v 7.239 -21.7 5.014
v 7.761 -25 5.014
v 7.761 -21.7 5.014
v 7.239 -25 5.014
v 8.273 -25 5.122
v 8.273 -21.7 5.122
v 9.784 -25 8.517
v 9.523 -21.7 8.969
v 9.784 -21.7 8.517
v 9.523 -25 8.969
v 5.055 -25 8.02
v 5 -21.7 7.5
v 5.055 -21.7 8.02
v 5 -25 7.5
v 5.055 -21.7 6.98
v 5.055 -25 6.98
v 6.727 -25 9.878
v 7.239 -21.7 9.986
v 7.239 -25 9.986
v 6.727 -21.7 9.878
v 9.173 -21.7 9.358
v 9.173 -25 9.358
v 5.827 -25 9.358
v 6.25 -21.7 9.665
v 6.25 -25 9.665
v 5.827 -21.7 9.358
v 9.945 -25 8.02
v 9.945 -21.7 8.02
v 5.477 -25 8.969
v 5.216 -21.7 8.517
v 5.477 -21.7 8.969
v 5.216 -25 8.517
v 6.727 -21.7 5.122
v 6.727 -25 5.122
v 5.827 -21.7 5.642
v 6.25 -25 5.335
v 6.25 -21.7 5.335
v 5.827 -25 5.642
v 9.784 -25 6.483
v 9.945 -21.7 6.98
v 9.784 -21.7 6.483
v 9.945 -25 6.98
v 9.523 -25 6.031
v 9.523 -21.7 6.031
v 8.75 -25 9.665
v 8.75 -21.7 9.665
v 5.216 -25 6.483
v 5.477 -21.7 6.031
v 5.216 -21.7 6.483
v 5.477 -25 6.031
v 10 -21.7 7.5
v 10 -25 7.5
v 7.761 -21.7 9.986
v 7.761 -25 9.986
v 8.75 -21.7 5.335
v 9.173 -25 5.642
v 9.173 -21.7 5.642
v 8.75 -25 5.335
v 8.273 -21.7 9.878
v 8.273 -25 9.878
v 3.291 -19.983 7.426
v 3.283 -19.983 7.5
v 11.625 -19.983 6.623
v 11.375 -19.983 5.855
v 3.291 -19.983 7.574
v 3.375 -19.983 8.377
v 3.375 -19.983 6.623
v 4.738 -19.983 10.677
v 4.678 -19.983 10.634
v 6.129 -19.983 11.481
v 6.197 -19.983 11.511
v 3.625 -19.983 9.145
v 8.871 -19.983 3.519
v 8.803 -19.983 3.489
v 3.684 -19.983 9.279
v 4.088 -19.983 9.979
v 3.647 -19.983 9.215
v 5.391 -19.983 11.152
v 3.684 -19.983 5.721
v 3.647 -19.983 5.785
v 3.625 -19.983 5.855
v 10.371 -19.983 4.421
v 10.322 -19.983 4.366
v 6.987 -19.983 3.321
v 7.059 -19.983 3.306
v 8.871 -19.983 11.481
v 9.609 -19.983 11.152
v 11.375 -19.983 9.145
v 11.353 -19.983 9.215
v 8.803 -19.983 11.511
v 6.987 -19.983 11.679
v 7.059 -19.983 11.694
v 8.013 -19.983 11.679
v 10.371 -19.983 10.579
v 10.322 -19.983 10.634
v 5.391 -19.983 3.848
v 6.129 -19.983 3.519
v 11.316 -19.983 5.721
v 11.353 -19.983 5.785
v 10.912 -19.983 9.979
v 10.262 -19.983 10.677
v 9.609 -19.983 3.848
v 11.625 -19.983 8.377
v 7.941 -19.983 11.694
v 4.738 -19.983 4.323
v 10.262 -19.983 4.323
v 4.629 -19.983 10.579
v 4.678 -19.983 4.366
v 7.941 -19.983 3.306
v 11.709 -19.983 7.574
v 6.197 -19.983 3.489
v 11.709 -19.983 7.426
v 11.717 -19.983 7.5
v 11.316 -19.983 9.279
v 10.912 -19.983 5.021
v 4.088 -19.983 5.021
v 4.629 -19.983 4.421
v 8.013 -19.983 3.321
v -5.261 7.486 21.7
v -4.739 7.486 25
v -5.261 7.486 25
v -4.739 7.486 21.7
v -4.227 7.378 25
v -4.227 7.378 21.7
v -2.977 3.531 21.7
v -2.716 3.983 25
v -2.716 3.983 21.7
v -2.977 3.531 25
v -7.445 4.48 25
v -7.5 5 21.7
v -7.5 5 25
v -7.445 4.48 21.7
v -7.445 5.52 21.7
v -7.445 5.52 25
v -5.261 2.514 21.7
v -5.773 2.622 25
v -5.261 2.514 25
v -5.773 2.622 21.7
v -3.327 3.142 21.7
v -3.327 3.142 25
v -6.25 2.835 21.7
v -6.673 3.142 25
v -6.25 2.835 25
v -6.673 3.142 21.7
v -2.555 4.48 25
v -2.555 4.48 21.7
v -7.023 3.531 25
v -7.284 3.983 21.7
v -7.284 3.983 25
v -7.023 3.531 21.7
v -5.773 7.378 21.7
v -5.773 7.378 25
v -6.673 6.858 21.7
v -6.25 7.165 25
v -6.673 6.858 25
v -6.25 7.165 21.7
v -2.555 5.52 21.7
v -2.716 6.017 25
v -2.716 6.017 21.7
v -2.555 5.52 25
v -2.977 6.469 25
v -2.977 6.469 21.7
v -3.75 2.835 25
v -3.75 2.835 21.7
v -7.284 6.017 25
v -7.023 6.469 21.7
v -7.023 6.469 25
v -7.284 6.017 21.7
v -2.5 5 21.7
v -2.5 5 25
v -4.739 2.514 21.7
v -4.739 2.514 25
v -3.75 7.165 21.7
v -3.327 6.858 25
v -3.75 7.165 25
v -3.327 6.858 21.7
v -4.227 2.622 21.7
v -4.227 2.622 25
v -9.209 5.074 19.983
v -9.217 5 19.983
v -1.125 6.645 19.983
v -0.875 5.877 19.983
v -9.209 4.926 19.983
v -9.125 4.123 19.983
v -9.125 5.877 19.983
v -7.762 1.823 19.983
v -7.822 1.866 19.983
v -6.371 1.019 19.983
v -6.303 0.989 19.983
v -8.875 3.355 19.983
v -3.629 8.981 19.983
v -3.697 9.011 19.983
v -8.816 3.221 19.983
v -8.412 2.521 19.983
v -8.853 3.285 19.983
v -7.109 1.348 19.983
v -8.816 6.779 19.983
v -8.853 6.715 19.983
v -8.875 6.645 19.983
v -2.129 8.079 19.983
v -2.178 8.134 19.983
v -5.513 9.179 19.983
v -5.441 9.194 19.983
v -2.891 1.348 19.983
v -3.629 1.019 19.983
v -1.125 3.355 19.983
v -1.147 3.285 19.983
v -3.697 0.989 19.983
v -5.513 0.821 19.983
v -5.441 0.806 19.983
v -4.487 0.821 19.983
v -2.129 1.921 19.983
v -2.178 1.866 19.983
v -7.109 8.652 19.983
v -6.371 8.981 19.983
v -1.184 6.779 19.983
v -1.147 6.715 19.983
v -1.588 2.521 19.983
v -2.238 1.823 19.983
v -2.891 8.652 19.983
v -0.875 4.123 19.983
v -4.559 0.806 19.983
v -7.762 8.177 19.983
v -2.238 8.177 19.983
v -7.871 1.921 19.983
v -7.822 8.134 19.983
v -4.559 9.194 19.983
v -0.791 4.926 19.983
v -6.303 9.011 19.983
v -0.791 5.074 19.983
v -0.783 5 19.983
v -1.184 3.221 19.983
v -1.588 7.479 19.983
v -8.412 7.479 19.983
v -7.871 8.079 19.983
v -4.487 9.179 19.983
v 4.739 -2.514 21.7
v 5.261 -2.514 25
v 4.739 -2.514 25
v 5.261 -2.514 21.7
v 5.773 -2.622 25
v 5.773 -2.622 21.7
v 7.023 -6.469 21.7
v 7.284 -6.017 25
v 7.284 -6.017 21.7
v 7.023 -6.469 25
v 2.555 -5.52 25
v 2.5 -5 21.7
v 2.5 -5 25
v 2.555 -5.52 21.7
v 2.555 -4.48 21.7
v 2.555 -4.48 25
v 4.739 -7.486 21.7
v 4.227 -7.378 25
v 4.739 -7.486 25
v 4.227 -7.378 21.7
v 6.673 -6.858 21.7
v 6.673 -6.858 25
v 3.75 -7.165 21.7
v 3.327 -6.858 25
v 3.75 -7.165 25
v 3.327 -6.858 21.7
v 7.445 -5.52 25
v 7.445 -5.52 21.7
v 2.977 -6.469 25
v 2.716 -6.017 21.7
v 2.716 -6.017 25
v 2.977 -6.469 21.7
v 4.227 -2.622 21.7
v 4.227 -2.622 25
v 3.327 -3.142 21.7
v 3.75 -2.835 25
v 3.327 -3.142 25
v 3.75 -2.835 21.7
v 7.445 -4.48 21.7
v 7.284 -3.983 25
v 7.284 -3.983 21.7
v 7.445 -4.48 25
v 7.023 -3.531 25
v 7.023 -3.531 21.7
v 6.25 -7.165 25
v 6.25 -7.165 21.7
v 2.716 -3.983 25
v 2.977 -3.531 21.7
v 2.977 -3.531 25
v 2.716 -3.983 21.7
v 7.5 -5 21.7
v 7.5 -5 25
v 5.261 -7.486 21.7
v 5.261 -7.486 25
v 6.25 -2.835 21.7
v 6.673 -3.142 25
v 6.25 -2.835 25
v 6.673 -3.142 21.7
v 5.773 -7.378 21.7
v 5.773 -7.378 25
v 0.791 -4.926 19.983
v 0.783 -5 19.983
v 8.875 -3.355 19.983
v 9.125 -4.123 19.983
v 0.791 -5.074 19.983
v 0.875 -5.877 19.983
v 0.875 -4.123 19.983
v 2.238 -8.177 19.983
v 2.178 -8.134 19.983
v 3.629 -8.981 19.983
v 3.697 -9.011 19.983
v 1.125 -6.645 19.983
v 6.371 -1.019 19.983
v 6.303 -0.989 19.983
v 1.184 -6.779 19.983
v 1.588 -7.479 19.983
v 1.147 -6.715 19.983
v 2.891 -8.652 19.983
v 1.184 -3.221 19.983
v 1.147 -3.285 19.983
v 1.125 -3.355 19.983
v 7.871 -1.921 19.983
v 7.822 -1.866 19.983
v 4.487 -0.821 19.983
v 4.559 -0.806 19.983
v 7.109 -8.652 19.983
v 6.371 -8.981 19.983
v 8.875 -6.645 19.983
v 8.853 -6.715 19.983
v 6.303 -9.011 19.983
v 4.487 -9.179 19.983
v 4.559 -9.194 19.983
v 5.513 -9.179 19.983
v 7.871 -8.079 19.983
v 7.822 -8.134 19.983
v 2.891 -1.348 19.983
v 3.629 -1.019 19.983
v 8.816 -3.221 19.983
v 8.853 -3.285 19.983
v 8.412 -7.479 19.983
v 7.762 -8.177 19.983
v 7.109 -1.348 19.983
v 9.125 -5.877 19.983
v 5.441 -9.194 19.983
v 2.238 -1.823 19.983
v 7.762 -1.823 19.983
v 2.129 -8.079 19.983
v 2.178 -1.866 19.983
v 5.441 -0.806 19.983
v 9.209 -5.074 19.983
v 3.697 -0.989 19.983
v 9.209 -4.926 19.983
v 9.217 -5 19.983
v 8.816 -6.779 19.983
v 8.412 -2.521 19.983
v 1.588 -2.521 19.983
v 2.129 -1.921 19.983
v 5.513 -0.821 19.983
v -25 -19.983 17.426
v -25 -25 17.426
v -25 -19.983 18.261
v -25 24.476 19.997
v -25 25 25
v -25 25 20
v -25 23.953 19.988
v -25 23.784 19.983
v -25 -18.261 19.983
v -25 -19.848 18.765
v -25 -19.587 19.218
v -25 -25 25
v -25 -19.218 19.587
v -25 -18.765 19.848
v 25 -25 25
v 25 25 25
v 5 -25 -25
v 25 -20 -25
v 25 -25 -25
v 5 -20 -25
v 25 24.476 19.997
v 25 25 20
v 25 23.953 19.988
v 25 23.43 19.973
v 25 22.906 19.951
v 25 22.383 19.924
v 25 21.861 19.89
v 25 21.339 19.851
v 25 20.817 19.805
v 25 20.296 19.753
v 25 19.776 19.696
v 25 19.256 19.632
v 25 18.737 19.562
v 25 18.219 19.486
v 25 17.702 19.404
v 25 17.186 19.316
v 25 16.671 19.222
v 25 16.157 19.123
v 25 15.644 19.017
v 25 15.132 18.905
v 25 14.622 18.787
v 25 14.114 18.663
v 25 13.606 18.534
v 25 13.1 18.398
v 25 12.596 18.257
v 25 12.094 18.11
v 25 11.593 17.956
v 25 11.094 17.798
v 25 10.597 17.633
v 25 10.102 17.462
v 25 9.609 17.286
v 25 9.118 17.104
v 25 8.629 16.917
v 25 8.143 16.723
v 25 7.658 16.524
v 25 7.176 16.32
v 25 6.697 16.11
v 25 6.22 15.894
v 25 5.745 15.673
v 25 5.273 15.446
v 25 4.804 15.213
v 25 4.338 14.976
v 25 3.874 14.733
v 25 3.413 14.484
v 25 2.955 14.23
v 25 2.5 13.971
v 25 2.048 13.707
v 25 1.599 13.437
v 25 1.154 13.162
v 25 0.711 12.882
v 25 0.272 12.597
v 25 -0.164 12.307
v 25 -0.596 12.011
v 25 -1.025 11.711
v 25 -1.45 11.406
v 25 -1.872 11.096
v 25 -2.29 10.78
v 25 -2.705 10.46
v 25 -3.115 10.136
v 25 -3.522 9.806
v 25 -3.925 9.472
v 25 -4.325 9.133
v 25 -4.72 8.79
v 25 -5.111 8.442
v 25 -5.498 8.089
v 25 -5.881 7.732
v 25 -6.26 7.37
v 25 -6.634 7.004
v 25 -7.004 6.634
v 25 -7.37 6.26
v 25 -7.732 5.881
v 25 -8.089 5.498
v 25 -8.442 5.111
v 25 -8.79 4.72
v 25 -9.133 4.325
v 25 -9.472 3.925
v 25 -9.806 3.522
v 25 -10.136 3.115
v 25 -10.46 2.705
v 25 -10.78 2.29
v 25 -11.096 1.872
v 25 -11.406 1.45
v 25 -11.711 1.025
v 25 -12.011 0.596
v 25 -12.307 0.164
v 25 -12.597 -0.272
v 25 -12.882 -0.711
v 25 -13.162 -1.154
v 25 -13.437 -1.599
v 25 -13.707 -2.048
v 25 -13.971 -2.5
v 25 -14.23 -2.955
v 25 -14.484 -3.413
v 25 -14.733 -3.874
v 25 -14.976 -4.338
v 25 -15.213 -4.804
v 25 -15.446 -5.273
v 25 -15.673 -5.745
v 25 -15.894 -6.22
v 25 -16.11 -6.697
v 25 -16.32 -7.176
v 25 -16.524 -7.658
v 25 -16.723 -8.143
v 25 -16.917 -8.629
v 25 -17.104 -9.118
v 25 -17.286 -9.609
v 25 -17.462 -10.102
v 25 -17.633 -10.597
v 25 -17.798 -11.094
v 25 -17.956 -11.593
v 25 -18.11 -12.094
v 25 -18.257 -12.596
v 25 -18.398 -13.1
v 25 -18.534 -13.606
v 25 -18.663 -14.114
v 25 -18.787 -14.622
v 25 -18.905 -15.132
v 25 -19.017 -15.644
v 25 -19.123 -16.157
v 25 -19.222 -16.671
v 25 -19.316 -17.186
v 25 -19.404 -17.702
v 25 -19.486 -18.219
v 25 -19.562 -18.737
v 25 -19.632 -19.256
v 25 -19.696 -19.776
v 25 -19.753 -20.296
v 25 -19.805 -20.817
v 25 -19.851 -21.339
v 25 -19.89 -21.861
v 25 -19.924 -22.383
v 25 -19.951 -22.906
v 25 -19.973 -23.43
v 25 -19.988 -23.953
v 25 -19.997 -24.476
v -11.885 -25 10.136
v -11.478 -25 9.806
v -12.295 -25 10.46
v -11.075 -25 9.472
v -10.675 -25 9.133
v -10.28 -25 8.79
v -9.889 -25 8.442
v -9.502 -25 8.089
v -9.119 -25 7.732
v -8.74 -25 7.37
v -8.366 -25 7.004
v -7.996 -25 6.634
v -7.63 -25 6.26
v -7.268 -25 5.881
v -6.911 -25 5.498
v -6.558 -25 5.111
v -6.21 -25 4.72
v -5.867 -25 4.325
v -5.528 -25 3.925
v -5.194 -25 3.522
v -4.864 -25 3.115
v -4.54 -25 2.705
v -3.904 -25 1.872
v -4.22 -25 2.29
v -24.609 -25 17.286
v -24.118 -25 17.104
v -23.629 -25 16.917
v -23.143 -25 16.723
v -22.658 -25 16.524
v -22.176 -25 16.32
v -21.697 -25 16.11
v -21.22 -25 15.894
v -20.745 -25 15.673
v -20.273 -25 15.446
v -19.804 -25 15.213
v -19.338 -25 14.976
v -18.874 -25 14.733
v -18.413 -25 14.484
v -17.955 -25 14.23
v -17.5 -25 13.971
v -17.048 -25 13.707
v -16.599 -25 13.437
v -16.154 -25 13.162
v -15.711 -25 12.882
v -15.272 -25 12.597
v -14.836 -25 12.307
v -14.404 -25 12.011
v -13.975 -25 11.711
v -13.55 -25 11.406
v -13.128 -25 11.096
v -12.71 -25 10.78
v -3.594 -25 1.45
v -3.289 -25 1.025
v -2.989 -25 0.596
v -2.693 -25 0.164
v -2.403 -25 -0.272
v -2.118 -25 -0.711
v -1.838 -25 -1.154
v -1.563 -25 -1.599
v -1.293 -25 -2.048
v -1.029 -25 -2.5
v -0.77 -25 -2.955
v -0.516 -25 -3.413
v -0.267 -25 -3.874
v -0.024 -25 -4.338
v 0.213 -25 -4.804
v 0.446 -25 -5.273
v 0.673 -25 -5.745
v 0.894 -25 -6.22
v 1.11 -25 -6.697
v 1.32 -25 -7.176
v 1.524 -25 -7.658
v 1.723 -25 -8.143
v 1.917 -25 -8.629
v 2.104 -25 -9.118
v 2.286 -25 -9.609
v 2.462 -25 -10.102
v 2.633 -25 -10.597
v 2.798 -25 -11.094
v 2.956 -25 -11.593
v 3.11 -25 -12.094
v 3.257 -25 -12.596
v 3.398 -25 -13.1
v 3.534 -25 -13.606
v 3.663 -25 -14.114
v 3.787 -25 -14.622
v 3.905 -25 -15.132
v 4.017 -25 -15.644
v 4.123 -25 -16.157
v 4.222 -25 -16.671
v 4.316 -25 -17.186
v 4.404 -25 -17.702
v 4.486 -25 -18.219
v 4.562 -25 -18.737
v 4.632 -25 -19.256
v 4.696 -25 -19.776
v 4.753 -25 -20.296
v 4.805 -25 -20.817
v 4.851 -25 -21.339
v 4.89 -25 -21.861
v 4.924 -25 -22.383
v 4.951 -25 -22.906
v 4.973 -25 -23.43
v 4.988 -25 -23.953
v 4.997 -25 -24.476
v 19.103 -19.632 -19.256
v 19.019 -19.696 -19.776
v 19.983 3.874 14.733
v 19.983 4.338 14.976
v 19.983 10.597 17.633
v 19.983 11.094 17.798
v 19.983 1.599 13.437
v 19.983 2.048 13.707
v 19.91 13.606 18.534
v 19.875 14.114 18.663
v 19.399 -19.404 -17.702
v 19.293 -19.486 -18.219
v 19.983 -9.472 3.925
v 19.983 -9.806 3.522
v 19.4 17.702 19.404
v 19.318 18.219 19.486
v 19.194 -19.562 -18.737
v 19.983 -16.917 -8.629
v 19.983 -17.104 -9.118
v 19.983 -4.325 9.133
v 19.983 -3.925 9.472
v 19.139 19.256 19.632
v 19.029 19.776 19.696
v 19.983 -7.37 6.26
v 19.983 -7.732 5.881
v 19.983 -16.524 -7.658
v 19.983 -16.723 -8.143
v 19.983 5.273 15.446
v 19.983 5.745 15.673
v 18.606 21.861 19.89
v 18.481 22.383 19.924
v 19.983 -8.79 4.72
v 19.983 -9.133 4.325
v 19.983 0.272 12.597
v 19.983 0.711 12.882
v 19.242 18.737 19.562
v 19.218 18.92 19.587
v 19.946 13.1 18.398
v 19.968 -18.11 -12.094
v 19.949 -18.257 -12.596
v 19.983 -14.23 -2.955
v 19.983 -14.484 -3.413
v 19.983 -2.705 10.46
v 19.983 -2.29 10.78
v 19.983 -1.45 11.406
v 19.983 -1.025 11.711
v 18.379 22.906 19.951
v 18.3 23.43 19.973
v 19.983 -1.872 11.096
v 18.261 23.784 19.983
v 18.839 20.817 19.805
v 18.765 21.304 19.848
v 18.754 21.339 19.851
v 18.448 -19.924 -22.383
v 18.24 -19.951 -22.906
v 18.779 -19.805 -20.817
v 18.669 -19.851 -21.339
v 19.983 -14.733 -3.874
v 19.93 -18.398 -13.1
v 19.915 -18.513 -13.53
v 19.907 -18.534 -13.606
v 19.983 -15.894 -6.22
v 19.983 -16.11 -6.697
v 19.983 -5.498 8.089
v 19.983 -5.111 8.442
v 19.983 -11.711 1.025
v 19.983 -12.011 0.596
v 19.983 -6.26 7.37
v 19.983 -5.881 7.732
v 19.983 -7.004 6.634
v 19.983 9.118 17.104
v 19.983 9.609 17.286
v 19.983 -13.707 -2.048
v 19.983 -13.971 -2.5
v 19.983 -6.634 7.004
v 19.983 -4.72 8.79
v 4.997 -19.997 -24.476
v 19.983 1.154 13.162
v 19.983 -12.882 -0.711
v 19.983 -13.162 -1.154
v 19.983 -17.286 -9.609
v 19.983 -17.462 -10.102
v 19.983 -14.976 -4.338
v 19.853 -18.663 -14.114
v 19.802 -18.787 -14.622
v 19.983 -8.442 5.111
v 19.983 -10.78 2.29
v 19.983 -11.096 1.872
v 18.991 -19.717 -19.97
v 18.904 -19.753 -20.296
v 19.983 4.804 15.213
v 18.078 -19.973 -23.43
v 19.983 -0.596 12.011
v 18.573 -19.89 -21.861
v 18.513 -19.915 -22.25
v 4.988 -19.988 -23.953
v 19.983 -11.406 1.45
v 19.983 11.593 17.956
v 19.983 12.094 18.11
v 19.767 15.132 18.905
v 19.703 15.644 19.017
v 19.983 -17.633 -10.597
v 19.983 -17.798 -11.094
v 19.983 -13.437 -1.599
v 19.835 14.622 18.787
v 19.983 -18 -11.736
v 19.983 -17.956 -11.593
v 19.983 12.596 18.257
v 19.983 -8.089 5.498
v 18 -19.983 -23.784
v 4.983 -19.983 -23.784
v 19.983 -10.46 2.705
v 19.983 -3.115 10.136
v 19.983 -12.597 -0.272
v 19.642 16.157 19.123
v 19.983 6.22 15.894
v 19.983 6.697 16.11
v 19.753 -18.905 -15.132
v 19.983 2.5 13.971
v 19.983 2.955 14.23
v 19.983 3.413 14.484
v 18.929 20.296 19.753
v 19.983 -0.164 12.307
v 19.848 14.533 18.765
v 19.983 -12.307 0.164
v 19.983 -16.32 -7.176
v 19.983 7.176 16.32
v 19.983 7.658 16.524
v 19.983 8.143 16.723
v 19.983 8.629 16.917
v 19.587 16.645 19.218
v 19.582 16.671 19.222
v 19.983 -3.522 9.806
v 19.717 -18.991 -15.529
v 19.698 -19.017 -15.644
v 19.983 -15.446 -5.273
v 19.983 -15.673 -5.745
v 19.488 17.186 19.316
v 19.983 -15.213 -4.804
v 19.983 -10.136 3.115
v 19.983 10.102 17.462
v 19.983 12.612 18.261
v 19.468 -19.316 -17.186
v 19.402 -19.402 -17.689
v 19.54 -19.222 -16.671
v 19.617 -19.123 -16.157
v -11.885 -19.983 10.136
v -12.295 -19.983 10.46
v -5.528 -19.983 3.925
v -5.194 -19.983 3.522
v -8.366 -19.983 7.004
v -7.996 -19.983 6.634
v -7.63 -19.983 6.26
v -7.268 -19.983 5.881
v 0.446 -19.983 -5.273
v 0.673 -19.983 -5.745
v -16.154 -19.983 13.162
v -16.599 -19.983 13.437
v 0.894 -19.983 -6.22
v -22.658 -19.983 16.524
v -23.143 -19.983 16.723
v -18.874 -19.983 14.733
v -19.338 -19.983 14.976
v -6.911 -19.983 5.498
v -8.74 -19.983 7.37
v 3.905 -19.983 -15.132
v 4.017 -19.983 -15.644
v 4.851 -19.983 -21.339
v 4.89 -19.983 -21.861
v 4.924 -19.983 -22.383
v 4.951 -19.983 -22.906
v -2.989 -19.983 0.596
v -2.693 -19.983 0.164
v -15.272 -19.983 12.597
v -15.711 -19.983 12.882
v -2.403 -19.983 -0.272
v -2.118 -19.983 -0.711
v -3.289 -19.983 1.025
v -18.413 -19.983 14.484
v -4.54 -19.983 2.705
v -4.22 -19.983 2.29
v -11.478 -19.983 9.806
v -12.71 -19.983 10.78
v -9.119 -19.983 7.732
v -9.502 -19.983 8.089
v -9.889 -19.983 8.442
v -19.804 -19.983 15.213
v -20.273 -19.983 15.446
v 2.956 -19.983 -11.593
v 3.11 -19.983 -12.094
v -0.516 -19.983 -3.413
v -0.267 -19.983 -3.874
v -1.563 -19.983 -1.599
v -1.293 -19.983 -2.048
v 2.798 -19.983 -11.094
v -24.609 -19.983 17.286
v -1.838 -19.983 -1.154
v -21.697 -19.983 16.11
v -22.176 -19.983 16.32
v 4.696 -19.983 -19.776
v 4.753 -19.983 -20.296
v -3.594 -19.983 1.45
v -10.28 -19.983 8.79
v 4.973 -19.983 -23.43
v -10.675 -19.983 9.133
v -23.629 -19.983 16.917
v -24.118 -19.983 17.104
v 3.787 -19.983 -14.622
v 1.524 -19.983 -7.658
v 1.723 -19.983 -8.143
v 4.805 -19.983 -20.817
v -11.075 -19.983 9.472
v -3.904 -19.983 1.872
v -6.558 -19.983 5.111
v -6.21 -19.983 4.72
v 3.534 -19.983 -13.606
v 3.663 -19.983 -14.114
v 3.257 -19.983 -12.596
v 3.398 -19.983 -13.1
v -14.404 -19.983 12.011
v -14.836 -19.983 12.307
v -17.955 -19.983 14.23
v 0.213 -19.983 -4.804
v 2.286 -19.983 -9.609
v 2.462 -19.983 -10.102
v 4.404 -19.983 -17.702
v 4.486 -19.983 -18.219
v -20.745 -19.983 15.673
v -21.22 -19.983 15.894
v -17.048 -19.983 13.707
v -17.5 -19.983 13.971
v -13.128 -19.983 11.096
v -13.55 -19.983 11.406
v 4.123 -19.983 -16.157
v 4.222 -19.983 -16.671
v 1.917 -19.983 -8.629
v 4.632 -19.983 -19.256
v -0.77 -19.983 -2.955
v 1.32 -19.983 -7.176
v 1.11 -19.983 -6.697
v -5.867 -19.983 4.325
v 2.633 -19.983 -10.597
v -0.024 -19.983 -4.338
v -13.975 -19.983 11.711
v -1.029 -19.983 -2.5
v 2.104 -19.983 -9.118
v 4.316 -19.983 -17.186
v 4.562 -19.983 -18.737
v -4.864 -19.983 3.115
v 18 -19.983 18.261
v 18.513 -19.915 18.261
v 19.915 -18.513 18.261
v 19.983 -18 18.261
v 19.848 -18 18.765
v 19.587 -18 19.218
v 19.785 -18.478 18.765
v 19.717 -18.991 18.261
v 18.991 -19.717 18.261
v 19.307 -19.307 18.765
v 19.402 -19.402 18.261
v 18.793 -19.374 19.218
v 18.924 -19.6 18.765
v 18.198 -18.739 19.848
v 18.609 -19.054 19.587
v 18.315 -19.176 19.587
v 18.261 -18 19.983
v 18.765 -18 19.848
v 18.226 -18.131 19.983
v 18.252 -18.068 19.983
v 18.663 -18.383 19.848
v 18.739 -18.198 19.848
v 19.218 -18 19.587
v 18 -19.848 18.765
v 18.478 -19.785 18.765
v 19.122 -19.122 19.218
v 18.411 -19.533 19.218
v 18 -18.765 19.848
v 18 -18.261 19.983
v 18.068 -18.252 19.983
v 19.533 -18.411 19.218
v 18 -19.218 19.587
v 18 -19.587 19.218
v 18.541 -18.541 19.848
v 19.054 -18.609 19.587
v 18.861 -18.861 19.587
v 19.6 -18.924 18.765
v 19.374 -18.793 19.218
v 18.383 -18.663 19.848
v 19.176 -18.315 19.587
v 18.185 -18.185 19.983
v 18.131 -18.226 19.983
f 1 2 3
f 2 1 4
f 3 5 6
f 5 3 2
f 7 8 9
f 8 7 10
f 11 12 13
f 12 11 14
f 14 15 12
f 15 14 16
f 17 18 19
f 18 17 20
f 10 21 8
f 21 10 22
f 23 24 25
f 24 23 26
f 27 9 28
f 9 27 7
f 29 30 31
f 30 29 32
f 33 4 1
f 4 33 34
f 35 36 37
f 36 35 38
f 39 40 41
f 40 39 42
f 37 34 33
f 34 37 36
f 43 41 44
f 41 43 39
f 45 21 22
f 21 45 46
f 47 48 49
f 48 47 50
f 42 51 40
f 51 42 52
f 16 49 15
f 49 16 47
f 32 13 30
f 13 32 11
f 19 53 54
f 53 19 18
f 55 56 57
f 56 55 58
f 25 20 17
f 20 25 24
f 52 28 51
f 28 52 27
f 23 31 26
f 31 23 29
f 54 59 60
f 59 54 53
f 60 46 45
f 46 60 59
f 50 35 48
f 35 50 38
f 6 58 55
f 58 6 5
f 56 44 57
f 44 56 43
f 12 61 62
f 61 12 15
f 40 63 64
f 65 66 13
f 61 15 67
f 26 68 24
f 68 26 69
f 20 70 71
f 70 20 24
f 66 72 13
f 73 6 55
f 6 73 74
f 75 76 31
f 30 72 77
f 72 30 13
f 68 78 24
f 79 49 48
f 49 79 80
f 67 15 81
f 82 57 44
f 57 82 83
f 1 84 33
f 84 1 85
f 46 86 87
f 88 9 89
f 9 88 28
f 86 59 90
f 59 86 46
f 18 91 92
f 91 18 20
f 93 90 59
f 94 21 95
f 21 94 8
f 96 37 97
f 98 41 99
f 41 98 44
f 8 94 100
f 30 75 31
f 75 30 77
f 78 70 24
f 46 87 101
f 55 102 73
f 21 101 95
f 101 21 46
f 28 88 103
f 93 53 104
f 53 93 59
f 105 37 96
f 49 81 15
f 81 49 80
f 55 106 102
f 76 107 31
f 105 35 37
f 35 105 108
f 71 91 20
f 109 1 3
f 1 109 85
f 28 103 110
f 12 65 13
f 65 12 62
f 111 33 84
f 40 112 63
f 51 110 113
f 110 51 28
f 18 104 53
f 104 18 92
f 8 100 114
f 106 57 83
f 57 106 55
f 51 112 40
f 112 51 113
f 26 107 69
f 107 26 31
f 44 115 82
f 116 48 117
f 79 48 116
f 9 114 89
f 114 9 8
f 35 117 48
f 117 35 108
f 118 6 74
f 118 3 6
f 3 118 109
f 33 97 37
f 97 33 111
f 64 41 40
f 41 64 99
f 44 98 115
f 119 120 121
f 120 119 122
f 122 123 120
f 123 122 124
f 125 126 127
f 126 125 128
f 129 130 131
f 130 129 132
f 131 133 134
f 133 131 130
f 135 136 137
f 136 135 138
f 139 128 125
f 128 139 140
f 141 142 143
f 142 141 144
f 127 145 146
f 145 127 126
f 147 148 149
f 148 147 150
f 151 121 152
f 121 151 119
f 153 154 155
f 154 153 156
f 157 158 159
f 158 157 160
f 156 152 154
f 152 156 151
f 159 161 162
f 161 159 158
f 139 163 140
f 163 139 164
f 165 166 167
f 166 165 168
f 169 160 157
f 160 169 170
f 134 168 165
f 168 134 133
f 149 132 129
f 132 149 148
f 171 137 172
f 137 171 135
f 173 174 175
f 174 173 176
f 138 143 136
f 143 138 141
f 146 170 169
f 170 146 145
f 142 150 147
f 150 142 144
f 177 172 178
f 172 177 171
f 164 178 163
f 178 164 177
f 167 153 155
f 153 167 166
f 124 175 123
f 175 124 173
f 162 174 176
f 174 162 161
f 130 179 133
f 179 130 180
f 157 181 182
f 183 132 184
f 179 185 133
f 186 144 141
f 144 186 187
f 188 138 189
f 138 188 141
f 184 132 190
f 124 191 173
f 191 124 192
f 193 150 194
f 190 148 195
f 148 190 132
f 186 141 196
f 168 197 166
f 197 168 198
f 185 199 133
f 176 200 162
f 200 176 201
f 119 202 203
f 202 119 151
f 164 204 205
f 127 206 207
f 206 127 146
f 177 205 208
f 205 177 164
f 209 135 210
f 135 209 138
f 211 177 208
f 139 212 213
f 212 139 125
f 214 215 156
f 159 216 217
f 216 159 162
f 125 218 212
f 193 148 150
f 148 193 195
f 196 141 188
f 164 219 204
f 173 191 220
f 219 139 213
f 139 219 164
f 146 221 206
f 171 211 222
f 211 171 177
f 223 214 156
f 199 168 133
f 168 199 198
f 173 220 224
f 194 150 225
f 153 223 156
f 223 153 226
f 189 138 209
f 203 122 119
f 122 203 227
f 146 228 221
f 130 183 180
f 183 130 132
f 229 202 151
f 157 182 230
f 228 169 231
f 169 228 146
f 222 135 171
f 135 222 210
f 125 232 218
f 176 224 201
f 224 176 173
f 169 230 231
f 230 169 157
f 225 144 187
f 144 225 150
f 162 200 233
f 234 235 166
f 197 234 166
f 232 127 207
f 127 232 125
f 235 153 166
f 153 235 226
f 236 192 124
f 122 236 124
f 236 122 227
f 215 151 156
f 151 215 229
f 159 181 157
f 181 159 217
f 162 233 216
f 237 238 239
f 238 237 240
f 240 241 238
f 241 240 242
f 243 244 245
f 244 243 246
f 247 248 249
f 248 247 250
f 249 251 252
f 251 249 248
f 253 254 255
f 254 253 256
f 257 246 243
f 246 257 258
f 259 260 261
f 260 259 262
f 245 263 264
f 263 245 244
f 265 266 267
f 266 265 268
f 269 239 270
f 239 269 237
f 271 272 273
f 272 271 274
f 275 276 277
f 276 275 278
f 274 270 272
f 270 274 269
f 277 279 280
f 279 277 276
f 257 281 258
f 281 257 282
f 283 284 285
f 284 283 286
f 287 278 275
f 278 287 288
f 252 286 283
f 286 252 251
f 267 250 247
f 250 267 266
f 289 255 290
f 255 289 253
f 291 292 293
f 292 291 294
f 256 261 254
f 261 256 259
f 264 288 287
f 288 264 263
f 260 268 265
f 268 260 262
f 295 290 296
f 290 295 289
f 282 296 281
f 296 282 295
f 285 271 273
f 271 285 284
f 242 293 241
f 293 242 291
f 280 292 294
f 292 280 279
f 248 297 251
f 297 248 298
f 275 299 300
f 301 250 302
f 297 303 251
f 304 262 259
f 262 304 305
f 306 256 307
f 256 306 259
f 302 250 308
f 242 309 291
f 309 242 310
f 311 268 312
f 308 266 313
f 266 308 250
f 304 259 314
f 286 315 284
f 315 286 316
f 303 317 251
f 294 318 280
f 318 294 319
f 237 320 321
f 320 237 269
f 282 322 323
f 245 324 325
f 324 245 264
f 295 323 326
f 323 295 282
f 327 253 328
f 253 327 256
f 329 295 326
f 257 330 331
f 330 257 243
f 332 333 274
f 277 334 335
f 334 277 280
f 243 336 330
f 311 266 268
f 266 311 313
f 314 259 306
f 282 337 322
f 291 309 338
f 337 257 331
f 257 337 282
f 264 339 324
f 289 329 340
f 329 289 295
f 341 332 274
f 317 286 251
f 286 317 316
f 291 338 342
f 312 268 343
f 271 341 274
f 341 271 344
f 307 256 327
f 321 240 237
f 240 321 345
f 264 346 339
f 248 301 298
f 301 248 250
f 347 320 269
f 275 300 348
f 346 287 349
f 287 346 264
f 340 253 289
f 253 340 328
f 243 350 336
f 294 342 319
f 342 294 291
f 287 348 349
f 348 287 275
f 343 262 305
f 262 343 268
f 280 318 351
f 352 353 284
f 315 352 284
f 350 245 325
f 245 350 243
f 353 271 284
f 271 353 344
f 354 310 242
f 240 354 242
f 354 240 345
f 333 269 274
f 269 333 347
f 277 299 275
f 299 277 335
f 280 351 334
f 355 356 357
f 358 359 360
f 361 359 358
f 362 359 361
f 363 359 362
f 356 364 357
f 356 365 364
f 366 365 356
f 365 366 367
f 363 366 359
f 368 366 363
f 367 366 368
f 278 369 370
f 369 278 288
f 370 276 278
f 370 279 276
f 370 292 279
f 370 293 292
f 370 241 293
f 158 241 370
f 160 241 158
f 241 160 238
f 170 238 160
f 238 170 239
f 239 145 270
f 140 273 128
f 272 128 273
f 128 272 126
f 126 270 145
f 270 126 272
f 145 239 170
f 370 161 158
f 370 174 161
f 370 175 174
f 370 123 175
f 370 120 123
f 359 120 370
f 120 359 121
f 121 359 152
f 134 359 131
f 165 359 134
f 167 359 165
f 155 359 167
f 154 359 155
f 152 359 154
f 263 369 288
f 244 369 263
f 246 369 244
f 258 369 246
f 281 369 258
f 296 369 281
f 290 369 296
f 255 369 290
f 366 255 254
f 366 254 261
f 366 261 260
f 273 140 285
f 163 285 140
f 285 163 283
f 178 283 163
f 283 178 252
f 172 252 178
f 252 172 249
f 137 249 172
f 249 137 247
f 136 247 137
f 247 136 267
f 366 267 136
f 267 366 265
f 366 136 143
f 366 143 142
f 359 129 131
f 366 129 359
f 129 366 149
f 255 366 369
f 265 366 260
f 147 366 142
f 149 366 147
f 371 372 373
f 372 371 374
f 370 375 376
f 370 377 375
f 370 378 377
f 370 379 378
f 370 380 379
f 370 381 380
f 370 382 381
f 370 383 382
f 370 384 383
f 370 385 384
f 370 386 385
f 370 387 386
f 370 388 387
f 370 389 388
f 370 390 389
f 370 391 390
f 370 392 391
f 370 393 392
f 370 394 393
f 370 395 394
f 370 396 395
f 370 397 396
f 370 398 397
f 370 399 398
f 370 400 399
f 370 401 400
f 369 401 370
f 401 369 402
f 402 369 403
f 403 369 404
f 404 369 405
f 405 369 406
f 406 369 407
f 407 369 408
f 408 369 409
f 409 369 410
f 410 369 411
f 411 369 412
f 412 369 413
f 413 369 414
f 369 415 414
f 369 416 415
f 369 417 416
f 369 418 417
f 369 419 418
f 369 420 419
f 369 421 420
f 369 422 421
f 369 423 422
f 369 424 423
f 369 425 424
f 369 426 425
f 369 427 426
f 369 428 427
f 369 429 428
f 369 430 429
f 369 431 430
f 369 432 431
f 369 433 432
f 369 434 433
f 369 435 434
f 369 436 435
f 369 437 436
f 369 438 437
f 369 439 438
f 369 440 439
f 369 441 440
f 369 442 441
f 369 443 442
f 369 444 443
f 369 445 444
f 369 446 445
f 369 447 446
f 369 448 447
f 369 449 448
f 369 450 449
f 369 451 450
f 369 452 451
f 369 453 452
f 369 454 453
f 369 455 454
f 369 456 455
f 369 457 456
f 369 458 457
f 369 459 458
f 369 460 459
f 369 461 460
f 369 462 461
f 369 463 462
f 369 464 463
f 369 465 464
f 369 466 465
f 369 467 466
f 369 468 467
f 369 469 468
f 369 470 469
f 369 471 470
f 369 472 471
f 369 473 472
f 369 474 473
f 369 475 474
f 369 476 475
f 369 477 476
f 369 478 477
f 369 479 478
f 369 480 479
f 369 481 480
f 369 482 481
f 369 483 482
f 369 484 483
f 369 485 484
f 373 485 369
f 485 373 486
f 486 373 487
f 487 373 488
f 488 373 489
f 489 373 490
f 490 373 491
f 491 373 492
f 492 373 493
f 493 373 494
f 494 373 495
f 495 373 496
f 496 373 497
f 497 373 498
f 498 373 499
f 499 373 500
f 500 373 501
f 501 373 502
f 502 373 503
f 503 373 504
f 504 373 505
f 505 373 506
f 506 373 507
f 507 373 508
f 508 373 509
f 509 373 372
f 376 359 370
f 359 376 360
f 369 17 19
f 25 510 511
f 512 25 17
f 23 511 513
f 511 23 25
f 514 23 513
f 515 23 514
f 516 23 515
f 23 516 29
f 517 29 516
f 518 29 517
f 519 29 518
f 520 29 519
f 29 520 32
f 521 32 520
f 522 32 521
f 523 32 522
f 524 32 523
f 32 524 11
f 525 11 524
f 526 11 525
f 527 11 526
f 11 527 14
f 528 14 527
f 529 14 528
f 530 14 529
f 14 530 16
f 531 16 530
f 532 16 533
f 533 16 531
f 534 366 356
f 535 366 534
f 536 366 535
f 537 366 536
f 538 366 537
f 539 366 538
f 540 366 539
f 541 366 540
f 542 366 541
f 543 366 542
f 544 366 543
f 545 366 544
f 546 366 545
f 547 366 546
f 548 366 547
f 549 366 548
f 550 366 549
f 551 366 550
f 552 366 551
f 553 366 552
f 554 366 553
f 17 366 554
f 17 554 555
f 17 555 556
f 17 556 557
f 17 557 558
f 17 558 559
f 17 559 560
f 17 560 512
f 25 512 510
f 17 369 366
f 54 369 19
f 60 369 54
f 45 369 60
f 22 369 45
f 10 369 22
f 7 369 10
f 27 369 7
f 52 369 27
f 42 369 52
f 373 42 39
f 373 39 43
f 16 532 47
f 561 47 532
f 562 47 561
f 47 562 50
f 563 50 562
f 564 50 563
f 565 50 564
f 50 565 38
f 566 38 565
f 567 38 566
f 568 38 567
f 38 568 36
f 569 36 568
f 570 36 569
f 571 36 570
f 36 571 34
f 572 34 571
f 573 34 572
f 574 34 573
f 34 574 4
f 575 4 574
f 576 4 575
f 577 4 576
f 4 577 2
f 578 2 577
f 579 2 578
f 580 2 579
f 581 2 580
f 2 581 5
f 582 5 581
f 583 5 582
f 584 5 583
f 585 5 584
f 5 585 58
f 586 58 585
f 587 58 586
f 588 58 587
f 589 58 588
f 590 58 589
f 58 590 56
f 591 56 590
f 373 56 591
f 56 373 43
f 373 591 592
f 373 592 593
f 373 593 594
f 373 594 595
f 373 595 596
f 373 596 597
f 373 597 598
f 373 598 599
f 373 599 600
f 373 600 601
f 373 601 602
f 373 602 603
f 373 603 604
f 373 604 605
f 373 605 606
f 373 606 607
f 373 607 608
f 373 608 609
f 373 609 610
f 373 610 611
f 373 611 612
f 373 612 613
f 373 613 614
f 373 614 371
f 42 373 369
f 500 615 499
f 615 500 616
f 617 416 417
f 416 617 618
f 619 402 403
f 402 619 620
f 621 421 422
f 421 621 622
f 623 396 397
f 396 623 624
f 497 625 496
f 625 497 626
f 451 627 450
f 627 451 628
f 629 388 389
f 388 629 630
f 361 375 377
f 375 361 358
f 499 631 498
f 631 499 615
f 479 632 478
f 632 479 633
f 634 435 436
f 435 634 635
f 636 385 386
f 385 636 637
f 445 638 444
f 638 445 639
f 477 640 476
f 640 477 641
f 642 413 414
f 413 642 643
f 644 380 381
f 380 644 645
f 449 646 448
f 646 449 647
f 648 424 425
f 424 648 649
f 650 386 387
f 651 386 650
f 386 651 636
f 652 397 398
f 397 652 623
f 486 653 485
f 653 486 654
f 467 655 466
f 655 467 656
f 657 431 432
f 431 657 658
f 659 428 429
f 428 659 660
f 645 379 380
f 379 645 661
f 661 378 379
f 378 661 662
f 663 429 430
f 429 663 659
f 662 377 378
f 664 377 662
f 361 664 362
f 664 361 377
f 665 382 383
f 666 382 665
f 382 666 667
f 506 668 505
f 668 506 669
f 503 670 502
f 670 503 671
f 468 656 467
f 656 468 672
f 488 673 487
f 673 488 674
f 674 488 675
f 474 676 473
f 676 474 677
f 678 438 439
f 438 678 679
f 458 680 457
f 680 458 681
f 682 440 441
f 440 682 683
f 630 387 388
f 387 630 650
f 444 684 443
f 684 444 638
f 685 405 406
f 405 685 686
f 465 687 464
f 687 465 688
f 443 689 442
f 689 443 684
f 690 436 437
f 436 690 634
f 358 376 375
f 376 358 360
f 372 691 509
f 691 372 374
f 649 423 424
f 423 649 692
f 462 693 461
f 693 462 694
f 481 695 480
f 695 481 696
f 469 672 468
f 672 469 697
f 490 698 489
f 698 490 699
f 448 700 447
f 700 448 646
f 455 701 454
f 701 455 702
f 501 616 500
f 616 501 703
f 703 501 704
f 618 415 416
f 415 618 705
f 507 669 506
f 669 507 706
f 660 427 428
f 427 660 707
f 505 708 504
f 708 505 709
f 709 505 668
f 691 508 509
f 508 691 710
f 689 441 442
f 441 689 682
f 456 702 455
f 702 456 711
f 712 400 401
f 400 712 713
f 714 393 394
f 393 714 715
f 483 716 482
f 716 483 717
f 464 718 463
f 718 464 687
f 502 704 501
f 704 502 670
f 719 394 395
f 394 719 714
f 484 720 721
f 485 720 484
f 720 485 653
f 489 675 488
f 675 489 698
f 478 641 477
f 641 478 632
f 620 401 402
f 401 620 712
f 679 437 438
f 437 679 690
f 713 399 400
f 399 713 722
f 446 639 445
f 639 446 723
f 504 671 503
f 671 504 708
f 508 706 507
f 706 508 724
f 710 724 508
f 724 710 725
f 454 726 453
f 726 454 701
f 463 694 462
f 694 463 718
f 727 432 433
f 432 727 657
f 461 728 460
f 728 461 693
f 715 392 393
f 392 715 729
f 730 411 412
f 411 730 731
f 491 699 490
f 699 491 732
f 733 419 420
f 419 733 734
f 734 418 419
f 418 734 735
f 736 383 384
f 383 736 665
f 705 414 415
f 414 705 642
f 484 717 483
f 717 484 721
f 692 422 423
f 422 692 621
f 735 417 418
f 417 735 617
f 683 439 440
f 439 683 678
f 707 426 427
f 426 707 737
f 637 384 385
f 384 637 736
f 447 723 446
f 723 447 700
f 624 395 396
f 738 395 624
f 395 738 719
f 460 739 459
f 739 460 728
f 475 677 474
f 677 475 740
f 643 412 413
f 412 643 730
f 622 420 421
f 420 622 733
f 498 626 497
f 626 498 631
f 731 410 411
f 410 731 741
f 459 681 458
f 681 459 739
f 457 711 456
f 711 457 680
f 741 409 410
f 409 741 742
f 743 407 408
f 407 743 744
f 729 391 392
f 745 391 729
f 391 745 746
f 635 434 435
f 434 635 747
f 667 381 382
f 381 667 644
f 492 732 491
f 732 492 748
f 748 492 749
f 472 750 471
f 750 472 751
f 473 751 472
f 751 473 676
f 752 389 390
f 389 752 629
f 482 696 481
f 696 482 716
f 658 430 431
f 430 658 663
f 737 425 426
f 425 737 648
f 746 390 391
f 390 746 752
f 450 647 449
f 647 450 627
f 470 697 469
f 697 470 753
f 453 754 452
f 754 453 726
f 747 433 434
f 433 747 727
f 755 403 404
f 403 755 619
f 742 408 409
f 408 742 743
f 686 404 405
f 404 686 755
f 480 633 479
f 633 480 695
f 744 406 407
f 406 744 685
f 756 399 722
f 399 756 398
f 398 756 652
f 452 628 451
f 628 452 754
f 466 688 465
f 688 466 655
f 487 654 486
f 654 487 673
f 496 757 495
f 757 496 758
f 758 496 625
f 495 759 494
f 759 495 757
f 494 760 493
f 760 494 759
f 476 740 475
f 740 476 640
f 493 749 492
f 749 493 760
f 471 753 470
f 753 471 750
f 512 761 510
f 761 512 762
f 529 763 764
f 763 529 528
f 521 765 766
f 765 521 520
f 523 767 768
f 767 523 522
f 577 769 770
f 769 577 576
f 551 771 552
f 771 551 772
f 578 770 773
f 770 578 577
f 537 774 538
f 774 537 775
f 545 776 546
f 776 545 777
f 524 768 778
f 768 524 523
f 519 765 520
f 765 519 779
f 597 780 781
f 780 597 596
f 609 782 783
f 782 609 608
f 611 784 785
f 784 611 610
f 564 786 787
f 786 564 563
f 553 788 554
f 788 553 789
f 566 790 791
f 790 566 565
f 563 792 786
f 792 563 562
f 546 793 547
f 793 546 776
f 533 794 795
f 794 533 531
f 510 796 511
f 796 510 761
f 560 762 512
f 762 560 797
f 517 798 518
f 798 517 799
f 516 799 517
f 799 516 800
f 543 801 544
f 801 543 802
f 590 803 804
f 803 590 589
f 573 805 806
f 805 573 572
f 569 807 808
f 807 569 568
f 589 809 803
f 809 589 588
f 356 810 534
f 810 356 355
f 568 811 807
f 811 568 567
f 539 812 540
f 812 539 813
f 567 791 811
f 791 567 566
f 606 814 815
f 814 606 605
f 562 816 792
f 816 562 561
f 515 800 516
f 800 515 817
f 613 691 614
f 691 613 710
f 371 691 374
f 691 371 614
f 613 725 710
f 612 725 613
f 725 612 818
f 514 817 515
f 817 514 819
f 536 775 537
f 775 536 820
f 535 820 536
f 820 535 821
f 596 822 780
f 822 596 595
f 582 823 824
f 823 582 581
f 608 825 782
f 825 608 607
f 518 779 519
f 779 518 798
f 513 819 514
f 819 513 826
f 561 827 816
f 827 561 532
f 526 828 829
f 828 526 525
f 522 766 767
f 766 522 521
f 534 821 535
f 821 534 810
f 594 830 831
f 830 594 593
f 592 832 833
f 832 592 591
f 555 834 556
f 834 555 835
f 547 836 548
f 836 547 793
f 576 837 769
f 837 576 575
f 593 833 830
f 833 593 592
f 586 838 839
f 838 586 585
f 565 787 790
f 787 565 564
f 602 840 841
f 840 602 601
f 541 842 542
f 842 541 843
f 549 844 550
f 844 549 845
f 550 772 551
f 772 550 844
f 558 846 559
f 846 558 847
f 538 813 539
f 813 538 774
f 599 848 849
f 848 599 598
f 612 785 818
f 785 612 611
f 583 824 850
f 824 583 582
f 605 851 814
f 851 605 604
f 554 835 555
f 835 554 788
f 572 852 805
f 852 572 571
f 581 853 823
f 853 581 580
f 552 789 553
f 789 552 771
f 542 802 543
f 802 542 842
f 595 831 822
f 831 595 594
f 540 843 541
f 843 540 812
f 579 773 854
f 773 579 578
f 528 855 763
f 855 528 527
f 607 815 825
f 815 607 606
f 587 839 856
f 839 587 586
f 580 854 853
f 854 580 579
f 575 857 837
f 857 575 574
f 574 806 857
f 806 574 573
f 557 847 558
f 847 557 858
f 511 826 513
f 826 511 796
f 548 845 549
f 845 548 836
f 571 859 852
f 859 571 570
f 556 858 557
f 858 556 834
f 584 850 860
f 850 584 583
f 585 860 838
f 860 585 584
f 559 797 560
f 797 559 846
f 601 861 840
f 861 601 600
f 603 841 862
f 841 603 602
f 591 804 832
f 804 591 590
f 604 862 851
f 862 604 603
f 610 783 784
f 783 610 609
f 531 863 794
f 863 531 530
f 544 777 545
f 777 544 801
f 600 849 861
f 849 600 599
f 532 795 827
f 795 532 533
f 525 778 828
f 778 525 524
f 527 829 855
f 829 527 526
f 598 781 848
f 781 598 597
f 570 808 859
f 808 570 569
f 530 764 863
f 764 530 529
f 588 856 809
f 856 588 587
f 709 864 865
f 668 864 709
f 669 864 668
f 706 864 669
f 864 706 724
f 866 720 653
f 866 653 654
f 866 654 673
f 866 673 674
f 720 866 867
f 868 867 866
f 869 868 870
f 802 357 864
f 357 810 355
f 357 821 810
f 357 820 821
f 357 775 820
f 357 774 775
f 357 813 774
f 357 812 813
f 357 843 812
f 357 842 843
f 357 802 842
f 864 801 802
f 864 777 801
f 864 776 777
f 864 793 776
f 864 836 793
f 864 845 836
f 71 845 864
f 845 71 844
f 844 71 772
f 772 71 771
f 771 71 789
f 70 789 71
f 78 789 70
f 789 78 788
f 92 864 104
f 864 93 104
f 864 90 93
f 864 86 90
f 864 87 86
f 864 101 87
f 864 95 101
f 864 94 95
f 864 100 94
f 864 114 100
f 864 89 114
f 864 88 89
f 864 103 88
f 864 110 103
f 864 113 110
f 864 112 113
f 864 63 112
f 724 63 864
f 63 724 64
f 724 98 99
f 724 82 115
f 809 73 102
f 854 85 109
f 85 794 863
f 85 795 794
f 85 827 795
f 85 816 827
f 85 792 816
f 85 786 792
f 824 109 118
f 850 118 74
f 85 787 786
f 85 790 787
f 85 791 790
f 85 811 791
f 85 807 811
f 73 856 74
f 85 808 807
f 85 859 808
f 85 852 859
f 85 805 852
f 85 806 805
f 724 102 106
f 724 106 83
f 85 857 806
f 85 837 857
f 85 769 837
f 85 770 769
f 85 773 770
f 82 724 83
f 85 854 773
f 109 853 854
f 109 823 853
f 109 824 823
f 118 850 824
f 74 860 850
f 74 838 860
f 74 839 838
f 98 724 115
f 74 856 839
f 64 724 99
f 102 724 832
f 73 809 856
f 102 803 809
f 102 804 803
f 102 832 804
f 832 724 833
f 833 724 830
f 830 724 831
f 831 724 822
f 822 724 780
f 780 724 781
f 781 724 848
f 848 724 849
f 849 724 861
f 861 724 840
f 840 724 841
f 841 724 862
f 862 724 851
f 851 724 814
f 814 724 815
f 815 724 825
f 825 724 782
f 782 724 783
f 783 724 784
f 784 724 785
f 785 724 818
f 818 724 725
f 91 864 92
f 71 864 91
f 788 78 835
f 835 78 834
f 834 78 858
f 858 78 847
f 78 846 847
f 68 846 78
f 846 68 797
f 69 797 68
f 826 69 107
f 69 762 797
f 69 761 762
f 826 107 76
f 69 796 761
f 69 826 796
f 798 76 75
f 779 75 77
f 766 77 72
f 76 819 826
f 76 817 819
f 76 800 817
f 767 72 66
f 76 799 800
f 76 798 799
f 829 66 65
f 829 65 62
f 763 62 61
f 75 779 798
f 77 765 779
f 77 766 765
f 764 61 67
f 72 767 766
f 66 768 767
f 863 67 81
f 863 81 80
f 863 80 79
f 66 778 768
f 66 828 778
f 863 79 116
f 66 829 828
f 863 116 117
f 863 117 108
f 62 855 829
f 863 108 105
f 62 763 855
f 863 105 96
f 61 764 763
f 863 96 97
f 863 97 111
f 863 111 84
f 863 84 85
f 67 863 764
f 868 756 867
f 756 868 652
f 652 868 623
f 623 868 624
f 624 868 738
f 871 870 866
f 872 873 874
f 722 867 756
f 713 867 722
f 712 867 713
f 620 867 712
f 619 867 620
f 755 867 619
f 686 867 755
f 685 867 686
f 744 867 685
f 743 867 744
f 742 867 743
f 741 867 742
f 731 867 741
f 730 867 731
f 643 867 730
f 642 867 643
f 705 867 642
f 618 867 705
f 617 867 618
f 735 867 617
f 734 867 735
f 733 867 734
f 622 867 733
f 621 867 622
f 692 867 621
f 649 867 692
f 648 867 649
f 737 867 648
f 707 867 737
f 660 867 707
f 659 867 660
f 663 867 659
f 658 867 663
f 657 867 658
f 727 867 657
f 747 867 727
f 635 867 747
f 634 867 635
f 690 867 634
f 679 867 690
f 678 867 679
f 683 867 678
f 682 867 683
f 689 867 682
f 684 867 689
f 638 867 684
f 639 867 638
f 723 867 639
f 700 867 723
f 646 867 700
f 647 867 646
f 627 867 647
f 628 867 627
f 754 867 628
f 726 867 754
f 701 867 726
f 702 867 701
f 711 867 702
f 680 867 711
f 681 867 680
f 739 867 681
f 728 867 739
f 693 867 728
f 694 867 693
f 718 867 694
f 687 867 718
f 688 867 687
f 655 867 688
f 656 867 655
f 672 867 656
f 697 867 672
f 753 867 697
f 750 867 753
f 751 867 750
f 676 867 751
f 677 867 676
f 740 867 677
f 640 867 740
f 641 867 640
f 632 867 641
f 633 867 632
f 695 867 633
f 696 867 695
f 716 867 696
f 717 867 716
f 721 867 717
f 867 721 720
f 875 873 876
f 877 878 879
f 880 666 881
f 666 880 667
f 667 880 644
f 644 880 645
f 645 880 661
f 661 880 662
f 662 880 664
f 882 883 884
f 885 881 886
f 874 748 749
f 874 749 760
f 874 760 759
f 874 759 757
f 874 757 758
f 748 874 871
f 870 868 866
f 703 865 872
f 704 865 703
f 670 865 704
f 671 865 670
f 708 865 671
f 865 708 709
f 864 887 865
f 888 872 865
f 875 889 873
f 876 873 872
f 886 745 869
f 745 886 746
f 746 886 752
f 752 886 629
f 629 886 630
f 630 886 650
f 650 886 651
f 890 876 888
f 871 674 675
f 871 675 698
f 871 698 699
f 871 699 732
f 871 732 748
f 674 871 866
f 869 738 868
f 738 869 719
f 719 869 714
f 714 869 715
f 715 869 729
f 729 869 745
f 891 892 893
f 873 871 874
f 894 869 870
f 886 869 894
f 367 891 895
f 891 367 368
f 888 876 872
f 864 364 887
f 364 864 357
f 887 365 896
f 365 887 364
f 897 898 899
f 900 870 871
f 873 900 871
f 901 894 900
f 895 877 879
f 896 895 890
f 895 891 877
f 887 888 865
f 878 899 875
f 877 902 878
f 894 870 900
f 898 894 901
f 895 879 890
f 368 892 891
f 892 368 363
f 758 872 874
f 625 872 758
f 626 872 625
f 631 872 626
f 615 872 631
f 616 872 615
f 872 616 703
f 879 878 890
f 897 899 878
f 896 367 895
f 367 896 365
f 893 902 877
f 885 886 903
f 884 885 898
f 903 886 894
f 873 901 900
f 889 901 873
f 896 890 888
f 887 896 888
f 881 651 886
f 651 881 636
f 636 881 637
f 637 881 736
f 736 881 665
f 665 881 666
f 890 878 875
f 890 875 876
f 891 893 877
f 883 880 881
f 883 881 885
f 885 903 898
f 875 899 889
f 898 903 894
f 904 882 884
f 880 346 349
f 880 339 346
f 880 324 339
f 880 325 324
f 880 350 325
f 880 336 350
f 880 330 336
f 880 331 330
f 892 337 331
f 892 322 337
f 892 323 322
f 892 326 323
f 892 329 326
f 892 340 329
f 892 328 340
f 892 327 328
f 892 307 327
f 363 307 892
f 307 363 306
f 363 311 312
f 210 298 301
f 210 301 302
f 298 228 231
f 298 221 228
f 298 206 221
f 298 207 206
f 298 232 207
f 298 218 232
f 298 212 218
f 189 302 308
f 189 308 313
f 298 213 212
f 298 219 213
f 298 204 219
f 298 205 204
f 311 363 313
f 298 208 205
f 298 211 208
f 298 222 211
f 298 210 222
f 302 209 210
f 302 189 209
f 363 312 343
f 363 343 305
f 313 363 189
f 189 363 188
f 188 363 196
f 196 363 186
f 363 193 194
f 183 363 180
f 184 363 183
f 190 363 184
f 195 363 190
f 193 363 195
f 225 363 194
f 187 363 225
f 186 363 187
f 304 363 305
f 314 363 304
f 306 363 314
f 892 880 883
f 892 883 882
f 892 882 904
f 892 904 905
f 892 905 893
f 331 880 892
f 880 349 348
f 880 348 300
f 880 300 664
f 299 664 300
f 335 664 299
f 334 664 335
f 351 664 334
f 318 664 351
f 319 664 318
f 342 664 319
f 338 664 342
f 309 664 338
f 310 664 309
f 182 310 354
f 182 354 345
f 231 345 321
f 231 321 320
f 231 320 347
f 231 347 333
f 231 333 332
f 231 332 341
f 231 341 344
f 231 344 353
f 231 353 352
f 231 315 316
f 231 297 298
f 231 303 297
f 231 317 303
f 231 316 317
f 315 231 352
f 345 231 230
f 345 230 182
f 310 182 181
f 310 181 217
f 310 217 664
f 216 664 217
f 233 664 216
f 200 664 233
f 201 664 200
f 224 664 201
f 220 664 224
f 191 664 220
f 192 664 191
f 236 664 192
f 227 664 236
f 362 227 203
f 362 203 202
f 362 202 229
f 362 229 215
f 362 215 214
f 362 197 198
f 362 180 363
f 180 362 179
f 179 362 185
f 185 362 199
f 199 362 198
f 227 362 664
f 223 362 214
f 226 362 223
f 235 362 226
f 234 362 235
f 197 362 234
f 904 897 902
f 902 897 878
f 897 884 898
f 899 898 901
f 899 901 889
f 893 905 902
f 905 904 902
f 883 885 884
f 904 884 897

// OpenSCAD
// file: ../atis_lib.scad
module gyuru(r1, r2,h, w, center=false){
    difference(){
        cylinder(r1=r1,r2=r2,h, center=center, $fn=12*r1);
        translate([0,0,-0.1])cylinder(r1=r1-w, r2=r2-w,h+0.2, center=center, $fn=12*(r1-w)); // trükközés: már preview-ban is normálisan jelenjen meg a gyűrű
    }
}

//inset_width= min(nozzle dia/2, 0.4)
module inset_first_layer(inset_height=0.31,inset_width=0.2, render=false)
{   
    if (render == true){
        difference()
        { 
            children();

            translate([0,0,-1])
            linear_extrude(height=inset_height+1)
            difference()
            {
                offset(r = inset_width) 
                projection(cut=true) 
                translate([0,0,-inset_height])
                children();

                offset(r = -inset_width) 
                projection(cut=true) 
                translate([0,0,-inset_height])
                children();
            }
        } 
    }
    else{
        echo("Inset not rendered!");
    }
} 

module deszka(m, sz, v, vastagsag, cimke){
    cube([m,sz,v], center=true);
    if (m == vastagsag){
        t = sz * v;
        echo(cimke, m , sz, v, t/1000/1000);
    } else if (sz == vastagsag){
            t = m*v;
            echo(cimke, m , sz, v, t/1000/1000);
    } else if (v == vastagsag){
            t = m*sz;
            echo(cimke, m , sz, v, t/1000/1000);
    }
    echo(cimke, m , sz, v, t);
}



// csm=[melyseg, szelesseg, magassag, also resz magassag, ,henger sugara

//csatlakozo([5,10,20,2,2,1.5]);

module csatlakozo(csm){
    cw = csm[0];
    sz = csm[1];
    h = csm[2];
    ch = csm[3];
    ny = csm[4];
    R=csm[5];
    translate([-cw/2, -sz/2, -h/2]){
        cube([cw,sz,ch]);
        translate([0,sz,ch])
            rotate([90,0,0])
                linear_extrude(height=sz)polygon([[0,0], [cw, 0], [0,cw+1], [0,0]]);
        translate([0,(sz-ny)/2,0])
        intersection()
        {
            translate([0,R+ny/2,0])
                rotate([90,0,0])
                    linear_extrude(height=2*R)polygon([[0,0], [cw, 0], [cw, h-cw-1], [0,h], [0,0]]);
            union(){
                #cube([cw-R,ny, h]);
                translate([cw-R-0.5,ny/2,0]) cylinder(r=R, h=h,$fn=80);
            }
        }
    }
}

module gombolyitett_csatlakozo(csm){
    cw = csm[0]-1;
    sz = csm[1]-2;
    h = csm[2]-2;
    ch = csm[3];
    ny = csm[4];
    R=csm[5];
    translate([-cw/2, -sz/2, -h/2]){
        cube([cw,sz,ch]);
        translate([0,sz,ch])
            rotate([90,0,0])
                linear_extrude(height=sz)polygon([[0,0], [cw, 0], [0,cw+1], [0,0]]);
        translate([0,(sz-ny)/2,0])
        intersection()
        {
            translate([0,R+ny/2,0])
                rotate([90,0,0])
                    linear_extrude(height=2*R)polygon([[0,0], [cw, 0], [cw, h-cw-1], [0,h], [0,0]]);
            union(){
                cube([ny, ny,h]);
                translate([cw-R-0.5,ny/2,0]) cylinder(r=R, h=h,$fn=80);
            }
        }
    }
}

module kivagas(l, d, w){
    hull(){
        cylinder(r=d/2,h = w-2, $fn=12*d/2);
        translate([l-d,0,0])cylinder(r=d/2, h=w-2, $fn=12*d/2);
    }
    translate([0,0,w-2])hull(){
        cylinder(r1=d/2, r2=d/2+2,h = 2, $fn=12*d/2);
        translate([l-d,0,0])cylinder(r1=d/2, r2=d/2+2, h=2, $fn=12*d/2);
    }
}
// file: l_bracket.scad
//=============================================================================
// l-bracket.scad
//
// generates an l-bracket from the given parameters
//=============================================================================
// CHANGELOG
//
// v1.1 - makes side lengths independant, set $fn
// v1.0 - original release
//=============================================================================
// Written in 2018 by Patrick Barrett
//
// To the extent possible under law, the author(s) have dedicated all copyright
// and related and neighboring rights to this work to the public domain
// worldwide. This work is distributed without any warranty.
//
// See <http://creativecommons.org/publicdomain/zero/1.0/> for full dedication.
//=============================================================================


L_Bracket();

$fn = 24;

module stadium3d(a, r, z, center = false){
	offset_x = center ? -(r + (a / 2)) : 0;
	offset_y = center ? -(r) : 0;
	offset_z = center ? -(z / 2) : 0;

	translate([offset_x, offset_y, offset_z])
	union() {
		translate([r, 0, 0])
			cube([a, 2*r, z]);
		translate([r, r, 0])
			cylinder(h = z, r = r, center = false);
		translate([r + a, r, 0])
			cylinder(h = z, r = r);
	}
}

module L_Bracket(wall_thickness = 4,
                   internal_width = 12, //Ezt kell a lap vastagságára beállítani
                   slot_width = 4,
                   side_length_v = 30,
                   side_length_h = 20,)
{

    // customizable variables end here

    head_annulus = (internal_width/2) - (slot_width/2);

    abit = 0.0001 * 1; //use for making overlap to get single manifold stl
    union() {
        // horizontal wall
        difference() {
            cube([side_length_h + wall_thickness,
                  internal_width + 2*wall_thickness,
                  wall_thickness]);
            translate([wall_thickness + head_annulus,
                       wall_thickness + head_annulus,
                       -1])
                stadium3d(side_length_h - (2*head_annulus) - slot_width,
                          slot_width / 2,
                          wall_thickness + 2);
        }

        // vertiacle wall
        translate([wall_thickness, 0, 0])
        rotate([0,-90,0])
        difference() {
            cube([side_length_v + wall_thickness,
                  internal_width + 2*wall_thickness,
                  wall_thickness]);
            translate([wall_thickness + head_annulus,
                       wall_thickness + head_annulus,
                       -1])
                stadium3d(side_length_v - (2*head_annulus) - slot_width,
                          slot_width / 2,
                          wall_thickness + 2);
        }

        // bracer 1
        translate([wall_thickness - abit,
                   wall_thickness,
                   wall_thickness - abit])
        rotate([90,0,0])
        linear_extrude(height = wall_thickness) {
            polygon([[0,0],
                    [side_length_h,0],
                    [0,side_length_v]]);
        }

        // bracer 2
        translate([wall_thickness - abit,
                   2*wall_thickness + internal_width,
                   wall_thickness - abit])
        rotate([90,0,0])
        linear_extrude(height = wall_thickness) {
            polygon([[0,0],
                    [side_length_h,0],
                    [0,side_length_v]]);
        }
    }
}
// main file
use <l_bracket.scad>
use <../atis_lib.scad>

jobbos_oldalelem();;
//a();
//l_bracket(100);
module a(){
    
    import("ShelfSupportA.stl");
}

x=50;
ww=5;
r=(x-ww);
deszka=12.5;

module balos_oldalelem(){
    oldalelem();
}

module jobbos_oldalelem(){
    mirror([1,0,0])oldalelem();
}



module oldalelem(){
    module _cylinder(r,h, center=true){
        cylinder(r=r, h=h, $fn=12*r, center=center);
    }
    difference(){
        cube(x, center=true);
        translate([0/2, x/2,-x/2])rotate([0,90,0])_cylinder(r=r, h=x+2, center=true);
        translate([x/2+3*ww, 0/2,-x/2])rotate([90,0,0])_cylinder(r=r, h=x+2, center=true);//, $fn=12*r);
        translate([ww,ww,-ww])minkowski(){
            cube(x-4,center=true);
            sphere(r=2, $fn=24);
        }
       #translate([-3/2*ww,-x/2-0.2,3/2*ww])rotate([-90,0,0])kivagas(5,5,5.5);
       translate([ww,ww,x/2+0.2])mirror([0,0,1])kivagas(5,5,5.5);
       translate([-ww,-ww,x/2+0.2])mirror([0,0,1])kivagas(5,5,5.5);
       
        
    }
}


module l_bracket(x){
    L=15;
    D=5;
    W=5.5;
    
    m_teljes = 2*ww+deszka;
        difference(){
            cube([x,x,m_teljes], center=true);
            translate([ww, ww, 0])cube([x,x,deszka], center=true);
            translate([-L/2+D/2,-x/2-0.25,0])rotate([-90,0,0])kivagas(L,D,W);
            translate([-x/2-0.25,L/2-D/2,0])rotate(-90)rotate([-90,0,0])kivagas(L,D,W);
            translate([x/2+2*ww, x/2+2*ww, 0])cylinder(r=x, h=m_teljes+2, center=true, $fn=12*x);
            translate([-(x)/2,-(x)/2,0])rotate(45)cube(m_teljes, center=true);
            
        }
        x1=x/2-m_teljes*sqrt(2)/4-ww/2/sqrt(2);
        l_sized=sqrt(2)*m_teljes - ww;
        translate([-x1,-x1,0]){
            rotate(45)
            difference(){
                cube([ww, sqrt(2)*m_teljes-2*ww,m_teljes],center=true);
                translate([-ww/2-0.1,0,0])rotate([0,90,0])#kivagas(5,5,W);
            }
        }
}
